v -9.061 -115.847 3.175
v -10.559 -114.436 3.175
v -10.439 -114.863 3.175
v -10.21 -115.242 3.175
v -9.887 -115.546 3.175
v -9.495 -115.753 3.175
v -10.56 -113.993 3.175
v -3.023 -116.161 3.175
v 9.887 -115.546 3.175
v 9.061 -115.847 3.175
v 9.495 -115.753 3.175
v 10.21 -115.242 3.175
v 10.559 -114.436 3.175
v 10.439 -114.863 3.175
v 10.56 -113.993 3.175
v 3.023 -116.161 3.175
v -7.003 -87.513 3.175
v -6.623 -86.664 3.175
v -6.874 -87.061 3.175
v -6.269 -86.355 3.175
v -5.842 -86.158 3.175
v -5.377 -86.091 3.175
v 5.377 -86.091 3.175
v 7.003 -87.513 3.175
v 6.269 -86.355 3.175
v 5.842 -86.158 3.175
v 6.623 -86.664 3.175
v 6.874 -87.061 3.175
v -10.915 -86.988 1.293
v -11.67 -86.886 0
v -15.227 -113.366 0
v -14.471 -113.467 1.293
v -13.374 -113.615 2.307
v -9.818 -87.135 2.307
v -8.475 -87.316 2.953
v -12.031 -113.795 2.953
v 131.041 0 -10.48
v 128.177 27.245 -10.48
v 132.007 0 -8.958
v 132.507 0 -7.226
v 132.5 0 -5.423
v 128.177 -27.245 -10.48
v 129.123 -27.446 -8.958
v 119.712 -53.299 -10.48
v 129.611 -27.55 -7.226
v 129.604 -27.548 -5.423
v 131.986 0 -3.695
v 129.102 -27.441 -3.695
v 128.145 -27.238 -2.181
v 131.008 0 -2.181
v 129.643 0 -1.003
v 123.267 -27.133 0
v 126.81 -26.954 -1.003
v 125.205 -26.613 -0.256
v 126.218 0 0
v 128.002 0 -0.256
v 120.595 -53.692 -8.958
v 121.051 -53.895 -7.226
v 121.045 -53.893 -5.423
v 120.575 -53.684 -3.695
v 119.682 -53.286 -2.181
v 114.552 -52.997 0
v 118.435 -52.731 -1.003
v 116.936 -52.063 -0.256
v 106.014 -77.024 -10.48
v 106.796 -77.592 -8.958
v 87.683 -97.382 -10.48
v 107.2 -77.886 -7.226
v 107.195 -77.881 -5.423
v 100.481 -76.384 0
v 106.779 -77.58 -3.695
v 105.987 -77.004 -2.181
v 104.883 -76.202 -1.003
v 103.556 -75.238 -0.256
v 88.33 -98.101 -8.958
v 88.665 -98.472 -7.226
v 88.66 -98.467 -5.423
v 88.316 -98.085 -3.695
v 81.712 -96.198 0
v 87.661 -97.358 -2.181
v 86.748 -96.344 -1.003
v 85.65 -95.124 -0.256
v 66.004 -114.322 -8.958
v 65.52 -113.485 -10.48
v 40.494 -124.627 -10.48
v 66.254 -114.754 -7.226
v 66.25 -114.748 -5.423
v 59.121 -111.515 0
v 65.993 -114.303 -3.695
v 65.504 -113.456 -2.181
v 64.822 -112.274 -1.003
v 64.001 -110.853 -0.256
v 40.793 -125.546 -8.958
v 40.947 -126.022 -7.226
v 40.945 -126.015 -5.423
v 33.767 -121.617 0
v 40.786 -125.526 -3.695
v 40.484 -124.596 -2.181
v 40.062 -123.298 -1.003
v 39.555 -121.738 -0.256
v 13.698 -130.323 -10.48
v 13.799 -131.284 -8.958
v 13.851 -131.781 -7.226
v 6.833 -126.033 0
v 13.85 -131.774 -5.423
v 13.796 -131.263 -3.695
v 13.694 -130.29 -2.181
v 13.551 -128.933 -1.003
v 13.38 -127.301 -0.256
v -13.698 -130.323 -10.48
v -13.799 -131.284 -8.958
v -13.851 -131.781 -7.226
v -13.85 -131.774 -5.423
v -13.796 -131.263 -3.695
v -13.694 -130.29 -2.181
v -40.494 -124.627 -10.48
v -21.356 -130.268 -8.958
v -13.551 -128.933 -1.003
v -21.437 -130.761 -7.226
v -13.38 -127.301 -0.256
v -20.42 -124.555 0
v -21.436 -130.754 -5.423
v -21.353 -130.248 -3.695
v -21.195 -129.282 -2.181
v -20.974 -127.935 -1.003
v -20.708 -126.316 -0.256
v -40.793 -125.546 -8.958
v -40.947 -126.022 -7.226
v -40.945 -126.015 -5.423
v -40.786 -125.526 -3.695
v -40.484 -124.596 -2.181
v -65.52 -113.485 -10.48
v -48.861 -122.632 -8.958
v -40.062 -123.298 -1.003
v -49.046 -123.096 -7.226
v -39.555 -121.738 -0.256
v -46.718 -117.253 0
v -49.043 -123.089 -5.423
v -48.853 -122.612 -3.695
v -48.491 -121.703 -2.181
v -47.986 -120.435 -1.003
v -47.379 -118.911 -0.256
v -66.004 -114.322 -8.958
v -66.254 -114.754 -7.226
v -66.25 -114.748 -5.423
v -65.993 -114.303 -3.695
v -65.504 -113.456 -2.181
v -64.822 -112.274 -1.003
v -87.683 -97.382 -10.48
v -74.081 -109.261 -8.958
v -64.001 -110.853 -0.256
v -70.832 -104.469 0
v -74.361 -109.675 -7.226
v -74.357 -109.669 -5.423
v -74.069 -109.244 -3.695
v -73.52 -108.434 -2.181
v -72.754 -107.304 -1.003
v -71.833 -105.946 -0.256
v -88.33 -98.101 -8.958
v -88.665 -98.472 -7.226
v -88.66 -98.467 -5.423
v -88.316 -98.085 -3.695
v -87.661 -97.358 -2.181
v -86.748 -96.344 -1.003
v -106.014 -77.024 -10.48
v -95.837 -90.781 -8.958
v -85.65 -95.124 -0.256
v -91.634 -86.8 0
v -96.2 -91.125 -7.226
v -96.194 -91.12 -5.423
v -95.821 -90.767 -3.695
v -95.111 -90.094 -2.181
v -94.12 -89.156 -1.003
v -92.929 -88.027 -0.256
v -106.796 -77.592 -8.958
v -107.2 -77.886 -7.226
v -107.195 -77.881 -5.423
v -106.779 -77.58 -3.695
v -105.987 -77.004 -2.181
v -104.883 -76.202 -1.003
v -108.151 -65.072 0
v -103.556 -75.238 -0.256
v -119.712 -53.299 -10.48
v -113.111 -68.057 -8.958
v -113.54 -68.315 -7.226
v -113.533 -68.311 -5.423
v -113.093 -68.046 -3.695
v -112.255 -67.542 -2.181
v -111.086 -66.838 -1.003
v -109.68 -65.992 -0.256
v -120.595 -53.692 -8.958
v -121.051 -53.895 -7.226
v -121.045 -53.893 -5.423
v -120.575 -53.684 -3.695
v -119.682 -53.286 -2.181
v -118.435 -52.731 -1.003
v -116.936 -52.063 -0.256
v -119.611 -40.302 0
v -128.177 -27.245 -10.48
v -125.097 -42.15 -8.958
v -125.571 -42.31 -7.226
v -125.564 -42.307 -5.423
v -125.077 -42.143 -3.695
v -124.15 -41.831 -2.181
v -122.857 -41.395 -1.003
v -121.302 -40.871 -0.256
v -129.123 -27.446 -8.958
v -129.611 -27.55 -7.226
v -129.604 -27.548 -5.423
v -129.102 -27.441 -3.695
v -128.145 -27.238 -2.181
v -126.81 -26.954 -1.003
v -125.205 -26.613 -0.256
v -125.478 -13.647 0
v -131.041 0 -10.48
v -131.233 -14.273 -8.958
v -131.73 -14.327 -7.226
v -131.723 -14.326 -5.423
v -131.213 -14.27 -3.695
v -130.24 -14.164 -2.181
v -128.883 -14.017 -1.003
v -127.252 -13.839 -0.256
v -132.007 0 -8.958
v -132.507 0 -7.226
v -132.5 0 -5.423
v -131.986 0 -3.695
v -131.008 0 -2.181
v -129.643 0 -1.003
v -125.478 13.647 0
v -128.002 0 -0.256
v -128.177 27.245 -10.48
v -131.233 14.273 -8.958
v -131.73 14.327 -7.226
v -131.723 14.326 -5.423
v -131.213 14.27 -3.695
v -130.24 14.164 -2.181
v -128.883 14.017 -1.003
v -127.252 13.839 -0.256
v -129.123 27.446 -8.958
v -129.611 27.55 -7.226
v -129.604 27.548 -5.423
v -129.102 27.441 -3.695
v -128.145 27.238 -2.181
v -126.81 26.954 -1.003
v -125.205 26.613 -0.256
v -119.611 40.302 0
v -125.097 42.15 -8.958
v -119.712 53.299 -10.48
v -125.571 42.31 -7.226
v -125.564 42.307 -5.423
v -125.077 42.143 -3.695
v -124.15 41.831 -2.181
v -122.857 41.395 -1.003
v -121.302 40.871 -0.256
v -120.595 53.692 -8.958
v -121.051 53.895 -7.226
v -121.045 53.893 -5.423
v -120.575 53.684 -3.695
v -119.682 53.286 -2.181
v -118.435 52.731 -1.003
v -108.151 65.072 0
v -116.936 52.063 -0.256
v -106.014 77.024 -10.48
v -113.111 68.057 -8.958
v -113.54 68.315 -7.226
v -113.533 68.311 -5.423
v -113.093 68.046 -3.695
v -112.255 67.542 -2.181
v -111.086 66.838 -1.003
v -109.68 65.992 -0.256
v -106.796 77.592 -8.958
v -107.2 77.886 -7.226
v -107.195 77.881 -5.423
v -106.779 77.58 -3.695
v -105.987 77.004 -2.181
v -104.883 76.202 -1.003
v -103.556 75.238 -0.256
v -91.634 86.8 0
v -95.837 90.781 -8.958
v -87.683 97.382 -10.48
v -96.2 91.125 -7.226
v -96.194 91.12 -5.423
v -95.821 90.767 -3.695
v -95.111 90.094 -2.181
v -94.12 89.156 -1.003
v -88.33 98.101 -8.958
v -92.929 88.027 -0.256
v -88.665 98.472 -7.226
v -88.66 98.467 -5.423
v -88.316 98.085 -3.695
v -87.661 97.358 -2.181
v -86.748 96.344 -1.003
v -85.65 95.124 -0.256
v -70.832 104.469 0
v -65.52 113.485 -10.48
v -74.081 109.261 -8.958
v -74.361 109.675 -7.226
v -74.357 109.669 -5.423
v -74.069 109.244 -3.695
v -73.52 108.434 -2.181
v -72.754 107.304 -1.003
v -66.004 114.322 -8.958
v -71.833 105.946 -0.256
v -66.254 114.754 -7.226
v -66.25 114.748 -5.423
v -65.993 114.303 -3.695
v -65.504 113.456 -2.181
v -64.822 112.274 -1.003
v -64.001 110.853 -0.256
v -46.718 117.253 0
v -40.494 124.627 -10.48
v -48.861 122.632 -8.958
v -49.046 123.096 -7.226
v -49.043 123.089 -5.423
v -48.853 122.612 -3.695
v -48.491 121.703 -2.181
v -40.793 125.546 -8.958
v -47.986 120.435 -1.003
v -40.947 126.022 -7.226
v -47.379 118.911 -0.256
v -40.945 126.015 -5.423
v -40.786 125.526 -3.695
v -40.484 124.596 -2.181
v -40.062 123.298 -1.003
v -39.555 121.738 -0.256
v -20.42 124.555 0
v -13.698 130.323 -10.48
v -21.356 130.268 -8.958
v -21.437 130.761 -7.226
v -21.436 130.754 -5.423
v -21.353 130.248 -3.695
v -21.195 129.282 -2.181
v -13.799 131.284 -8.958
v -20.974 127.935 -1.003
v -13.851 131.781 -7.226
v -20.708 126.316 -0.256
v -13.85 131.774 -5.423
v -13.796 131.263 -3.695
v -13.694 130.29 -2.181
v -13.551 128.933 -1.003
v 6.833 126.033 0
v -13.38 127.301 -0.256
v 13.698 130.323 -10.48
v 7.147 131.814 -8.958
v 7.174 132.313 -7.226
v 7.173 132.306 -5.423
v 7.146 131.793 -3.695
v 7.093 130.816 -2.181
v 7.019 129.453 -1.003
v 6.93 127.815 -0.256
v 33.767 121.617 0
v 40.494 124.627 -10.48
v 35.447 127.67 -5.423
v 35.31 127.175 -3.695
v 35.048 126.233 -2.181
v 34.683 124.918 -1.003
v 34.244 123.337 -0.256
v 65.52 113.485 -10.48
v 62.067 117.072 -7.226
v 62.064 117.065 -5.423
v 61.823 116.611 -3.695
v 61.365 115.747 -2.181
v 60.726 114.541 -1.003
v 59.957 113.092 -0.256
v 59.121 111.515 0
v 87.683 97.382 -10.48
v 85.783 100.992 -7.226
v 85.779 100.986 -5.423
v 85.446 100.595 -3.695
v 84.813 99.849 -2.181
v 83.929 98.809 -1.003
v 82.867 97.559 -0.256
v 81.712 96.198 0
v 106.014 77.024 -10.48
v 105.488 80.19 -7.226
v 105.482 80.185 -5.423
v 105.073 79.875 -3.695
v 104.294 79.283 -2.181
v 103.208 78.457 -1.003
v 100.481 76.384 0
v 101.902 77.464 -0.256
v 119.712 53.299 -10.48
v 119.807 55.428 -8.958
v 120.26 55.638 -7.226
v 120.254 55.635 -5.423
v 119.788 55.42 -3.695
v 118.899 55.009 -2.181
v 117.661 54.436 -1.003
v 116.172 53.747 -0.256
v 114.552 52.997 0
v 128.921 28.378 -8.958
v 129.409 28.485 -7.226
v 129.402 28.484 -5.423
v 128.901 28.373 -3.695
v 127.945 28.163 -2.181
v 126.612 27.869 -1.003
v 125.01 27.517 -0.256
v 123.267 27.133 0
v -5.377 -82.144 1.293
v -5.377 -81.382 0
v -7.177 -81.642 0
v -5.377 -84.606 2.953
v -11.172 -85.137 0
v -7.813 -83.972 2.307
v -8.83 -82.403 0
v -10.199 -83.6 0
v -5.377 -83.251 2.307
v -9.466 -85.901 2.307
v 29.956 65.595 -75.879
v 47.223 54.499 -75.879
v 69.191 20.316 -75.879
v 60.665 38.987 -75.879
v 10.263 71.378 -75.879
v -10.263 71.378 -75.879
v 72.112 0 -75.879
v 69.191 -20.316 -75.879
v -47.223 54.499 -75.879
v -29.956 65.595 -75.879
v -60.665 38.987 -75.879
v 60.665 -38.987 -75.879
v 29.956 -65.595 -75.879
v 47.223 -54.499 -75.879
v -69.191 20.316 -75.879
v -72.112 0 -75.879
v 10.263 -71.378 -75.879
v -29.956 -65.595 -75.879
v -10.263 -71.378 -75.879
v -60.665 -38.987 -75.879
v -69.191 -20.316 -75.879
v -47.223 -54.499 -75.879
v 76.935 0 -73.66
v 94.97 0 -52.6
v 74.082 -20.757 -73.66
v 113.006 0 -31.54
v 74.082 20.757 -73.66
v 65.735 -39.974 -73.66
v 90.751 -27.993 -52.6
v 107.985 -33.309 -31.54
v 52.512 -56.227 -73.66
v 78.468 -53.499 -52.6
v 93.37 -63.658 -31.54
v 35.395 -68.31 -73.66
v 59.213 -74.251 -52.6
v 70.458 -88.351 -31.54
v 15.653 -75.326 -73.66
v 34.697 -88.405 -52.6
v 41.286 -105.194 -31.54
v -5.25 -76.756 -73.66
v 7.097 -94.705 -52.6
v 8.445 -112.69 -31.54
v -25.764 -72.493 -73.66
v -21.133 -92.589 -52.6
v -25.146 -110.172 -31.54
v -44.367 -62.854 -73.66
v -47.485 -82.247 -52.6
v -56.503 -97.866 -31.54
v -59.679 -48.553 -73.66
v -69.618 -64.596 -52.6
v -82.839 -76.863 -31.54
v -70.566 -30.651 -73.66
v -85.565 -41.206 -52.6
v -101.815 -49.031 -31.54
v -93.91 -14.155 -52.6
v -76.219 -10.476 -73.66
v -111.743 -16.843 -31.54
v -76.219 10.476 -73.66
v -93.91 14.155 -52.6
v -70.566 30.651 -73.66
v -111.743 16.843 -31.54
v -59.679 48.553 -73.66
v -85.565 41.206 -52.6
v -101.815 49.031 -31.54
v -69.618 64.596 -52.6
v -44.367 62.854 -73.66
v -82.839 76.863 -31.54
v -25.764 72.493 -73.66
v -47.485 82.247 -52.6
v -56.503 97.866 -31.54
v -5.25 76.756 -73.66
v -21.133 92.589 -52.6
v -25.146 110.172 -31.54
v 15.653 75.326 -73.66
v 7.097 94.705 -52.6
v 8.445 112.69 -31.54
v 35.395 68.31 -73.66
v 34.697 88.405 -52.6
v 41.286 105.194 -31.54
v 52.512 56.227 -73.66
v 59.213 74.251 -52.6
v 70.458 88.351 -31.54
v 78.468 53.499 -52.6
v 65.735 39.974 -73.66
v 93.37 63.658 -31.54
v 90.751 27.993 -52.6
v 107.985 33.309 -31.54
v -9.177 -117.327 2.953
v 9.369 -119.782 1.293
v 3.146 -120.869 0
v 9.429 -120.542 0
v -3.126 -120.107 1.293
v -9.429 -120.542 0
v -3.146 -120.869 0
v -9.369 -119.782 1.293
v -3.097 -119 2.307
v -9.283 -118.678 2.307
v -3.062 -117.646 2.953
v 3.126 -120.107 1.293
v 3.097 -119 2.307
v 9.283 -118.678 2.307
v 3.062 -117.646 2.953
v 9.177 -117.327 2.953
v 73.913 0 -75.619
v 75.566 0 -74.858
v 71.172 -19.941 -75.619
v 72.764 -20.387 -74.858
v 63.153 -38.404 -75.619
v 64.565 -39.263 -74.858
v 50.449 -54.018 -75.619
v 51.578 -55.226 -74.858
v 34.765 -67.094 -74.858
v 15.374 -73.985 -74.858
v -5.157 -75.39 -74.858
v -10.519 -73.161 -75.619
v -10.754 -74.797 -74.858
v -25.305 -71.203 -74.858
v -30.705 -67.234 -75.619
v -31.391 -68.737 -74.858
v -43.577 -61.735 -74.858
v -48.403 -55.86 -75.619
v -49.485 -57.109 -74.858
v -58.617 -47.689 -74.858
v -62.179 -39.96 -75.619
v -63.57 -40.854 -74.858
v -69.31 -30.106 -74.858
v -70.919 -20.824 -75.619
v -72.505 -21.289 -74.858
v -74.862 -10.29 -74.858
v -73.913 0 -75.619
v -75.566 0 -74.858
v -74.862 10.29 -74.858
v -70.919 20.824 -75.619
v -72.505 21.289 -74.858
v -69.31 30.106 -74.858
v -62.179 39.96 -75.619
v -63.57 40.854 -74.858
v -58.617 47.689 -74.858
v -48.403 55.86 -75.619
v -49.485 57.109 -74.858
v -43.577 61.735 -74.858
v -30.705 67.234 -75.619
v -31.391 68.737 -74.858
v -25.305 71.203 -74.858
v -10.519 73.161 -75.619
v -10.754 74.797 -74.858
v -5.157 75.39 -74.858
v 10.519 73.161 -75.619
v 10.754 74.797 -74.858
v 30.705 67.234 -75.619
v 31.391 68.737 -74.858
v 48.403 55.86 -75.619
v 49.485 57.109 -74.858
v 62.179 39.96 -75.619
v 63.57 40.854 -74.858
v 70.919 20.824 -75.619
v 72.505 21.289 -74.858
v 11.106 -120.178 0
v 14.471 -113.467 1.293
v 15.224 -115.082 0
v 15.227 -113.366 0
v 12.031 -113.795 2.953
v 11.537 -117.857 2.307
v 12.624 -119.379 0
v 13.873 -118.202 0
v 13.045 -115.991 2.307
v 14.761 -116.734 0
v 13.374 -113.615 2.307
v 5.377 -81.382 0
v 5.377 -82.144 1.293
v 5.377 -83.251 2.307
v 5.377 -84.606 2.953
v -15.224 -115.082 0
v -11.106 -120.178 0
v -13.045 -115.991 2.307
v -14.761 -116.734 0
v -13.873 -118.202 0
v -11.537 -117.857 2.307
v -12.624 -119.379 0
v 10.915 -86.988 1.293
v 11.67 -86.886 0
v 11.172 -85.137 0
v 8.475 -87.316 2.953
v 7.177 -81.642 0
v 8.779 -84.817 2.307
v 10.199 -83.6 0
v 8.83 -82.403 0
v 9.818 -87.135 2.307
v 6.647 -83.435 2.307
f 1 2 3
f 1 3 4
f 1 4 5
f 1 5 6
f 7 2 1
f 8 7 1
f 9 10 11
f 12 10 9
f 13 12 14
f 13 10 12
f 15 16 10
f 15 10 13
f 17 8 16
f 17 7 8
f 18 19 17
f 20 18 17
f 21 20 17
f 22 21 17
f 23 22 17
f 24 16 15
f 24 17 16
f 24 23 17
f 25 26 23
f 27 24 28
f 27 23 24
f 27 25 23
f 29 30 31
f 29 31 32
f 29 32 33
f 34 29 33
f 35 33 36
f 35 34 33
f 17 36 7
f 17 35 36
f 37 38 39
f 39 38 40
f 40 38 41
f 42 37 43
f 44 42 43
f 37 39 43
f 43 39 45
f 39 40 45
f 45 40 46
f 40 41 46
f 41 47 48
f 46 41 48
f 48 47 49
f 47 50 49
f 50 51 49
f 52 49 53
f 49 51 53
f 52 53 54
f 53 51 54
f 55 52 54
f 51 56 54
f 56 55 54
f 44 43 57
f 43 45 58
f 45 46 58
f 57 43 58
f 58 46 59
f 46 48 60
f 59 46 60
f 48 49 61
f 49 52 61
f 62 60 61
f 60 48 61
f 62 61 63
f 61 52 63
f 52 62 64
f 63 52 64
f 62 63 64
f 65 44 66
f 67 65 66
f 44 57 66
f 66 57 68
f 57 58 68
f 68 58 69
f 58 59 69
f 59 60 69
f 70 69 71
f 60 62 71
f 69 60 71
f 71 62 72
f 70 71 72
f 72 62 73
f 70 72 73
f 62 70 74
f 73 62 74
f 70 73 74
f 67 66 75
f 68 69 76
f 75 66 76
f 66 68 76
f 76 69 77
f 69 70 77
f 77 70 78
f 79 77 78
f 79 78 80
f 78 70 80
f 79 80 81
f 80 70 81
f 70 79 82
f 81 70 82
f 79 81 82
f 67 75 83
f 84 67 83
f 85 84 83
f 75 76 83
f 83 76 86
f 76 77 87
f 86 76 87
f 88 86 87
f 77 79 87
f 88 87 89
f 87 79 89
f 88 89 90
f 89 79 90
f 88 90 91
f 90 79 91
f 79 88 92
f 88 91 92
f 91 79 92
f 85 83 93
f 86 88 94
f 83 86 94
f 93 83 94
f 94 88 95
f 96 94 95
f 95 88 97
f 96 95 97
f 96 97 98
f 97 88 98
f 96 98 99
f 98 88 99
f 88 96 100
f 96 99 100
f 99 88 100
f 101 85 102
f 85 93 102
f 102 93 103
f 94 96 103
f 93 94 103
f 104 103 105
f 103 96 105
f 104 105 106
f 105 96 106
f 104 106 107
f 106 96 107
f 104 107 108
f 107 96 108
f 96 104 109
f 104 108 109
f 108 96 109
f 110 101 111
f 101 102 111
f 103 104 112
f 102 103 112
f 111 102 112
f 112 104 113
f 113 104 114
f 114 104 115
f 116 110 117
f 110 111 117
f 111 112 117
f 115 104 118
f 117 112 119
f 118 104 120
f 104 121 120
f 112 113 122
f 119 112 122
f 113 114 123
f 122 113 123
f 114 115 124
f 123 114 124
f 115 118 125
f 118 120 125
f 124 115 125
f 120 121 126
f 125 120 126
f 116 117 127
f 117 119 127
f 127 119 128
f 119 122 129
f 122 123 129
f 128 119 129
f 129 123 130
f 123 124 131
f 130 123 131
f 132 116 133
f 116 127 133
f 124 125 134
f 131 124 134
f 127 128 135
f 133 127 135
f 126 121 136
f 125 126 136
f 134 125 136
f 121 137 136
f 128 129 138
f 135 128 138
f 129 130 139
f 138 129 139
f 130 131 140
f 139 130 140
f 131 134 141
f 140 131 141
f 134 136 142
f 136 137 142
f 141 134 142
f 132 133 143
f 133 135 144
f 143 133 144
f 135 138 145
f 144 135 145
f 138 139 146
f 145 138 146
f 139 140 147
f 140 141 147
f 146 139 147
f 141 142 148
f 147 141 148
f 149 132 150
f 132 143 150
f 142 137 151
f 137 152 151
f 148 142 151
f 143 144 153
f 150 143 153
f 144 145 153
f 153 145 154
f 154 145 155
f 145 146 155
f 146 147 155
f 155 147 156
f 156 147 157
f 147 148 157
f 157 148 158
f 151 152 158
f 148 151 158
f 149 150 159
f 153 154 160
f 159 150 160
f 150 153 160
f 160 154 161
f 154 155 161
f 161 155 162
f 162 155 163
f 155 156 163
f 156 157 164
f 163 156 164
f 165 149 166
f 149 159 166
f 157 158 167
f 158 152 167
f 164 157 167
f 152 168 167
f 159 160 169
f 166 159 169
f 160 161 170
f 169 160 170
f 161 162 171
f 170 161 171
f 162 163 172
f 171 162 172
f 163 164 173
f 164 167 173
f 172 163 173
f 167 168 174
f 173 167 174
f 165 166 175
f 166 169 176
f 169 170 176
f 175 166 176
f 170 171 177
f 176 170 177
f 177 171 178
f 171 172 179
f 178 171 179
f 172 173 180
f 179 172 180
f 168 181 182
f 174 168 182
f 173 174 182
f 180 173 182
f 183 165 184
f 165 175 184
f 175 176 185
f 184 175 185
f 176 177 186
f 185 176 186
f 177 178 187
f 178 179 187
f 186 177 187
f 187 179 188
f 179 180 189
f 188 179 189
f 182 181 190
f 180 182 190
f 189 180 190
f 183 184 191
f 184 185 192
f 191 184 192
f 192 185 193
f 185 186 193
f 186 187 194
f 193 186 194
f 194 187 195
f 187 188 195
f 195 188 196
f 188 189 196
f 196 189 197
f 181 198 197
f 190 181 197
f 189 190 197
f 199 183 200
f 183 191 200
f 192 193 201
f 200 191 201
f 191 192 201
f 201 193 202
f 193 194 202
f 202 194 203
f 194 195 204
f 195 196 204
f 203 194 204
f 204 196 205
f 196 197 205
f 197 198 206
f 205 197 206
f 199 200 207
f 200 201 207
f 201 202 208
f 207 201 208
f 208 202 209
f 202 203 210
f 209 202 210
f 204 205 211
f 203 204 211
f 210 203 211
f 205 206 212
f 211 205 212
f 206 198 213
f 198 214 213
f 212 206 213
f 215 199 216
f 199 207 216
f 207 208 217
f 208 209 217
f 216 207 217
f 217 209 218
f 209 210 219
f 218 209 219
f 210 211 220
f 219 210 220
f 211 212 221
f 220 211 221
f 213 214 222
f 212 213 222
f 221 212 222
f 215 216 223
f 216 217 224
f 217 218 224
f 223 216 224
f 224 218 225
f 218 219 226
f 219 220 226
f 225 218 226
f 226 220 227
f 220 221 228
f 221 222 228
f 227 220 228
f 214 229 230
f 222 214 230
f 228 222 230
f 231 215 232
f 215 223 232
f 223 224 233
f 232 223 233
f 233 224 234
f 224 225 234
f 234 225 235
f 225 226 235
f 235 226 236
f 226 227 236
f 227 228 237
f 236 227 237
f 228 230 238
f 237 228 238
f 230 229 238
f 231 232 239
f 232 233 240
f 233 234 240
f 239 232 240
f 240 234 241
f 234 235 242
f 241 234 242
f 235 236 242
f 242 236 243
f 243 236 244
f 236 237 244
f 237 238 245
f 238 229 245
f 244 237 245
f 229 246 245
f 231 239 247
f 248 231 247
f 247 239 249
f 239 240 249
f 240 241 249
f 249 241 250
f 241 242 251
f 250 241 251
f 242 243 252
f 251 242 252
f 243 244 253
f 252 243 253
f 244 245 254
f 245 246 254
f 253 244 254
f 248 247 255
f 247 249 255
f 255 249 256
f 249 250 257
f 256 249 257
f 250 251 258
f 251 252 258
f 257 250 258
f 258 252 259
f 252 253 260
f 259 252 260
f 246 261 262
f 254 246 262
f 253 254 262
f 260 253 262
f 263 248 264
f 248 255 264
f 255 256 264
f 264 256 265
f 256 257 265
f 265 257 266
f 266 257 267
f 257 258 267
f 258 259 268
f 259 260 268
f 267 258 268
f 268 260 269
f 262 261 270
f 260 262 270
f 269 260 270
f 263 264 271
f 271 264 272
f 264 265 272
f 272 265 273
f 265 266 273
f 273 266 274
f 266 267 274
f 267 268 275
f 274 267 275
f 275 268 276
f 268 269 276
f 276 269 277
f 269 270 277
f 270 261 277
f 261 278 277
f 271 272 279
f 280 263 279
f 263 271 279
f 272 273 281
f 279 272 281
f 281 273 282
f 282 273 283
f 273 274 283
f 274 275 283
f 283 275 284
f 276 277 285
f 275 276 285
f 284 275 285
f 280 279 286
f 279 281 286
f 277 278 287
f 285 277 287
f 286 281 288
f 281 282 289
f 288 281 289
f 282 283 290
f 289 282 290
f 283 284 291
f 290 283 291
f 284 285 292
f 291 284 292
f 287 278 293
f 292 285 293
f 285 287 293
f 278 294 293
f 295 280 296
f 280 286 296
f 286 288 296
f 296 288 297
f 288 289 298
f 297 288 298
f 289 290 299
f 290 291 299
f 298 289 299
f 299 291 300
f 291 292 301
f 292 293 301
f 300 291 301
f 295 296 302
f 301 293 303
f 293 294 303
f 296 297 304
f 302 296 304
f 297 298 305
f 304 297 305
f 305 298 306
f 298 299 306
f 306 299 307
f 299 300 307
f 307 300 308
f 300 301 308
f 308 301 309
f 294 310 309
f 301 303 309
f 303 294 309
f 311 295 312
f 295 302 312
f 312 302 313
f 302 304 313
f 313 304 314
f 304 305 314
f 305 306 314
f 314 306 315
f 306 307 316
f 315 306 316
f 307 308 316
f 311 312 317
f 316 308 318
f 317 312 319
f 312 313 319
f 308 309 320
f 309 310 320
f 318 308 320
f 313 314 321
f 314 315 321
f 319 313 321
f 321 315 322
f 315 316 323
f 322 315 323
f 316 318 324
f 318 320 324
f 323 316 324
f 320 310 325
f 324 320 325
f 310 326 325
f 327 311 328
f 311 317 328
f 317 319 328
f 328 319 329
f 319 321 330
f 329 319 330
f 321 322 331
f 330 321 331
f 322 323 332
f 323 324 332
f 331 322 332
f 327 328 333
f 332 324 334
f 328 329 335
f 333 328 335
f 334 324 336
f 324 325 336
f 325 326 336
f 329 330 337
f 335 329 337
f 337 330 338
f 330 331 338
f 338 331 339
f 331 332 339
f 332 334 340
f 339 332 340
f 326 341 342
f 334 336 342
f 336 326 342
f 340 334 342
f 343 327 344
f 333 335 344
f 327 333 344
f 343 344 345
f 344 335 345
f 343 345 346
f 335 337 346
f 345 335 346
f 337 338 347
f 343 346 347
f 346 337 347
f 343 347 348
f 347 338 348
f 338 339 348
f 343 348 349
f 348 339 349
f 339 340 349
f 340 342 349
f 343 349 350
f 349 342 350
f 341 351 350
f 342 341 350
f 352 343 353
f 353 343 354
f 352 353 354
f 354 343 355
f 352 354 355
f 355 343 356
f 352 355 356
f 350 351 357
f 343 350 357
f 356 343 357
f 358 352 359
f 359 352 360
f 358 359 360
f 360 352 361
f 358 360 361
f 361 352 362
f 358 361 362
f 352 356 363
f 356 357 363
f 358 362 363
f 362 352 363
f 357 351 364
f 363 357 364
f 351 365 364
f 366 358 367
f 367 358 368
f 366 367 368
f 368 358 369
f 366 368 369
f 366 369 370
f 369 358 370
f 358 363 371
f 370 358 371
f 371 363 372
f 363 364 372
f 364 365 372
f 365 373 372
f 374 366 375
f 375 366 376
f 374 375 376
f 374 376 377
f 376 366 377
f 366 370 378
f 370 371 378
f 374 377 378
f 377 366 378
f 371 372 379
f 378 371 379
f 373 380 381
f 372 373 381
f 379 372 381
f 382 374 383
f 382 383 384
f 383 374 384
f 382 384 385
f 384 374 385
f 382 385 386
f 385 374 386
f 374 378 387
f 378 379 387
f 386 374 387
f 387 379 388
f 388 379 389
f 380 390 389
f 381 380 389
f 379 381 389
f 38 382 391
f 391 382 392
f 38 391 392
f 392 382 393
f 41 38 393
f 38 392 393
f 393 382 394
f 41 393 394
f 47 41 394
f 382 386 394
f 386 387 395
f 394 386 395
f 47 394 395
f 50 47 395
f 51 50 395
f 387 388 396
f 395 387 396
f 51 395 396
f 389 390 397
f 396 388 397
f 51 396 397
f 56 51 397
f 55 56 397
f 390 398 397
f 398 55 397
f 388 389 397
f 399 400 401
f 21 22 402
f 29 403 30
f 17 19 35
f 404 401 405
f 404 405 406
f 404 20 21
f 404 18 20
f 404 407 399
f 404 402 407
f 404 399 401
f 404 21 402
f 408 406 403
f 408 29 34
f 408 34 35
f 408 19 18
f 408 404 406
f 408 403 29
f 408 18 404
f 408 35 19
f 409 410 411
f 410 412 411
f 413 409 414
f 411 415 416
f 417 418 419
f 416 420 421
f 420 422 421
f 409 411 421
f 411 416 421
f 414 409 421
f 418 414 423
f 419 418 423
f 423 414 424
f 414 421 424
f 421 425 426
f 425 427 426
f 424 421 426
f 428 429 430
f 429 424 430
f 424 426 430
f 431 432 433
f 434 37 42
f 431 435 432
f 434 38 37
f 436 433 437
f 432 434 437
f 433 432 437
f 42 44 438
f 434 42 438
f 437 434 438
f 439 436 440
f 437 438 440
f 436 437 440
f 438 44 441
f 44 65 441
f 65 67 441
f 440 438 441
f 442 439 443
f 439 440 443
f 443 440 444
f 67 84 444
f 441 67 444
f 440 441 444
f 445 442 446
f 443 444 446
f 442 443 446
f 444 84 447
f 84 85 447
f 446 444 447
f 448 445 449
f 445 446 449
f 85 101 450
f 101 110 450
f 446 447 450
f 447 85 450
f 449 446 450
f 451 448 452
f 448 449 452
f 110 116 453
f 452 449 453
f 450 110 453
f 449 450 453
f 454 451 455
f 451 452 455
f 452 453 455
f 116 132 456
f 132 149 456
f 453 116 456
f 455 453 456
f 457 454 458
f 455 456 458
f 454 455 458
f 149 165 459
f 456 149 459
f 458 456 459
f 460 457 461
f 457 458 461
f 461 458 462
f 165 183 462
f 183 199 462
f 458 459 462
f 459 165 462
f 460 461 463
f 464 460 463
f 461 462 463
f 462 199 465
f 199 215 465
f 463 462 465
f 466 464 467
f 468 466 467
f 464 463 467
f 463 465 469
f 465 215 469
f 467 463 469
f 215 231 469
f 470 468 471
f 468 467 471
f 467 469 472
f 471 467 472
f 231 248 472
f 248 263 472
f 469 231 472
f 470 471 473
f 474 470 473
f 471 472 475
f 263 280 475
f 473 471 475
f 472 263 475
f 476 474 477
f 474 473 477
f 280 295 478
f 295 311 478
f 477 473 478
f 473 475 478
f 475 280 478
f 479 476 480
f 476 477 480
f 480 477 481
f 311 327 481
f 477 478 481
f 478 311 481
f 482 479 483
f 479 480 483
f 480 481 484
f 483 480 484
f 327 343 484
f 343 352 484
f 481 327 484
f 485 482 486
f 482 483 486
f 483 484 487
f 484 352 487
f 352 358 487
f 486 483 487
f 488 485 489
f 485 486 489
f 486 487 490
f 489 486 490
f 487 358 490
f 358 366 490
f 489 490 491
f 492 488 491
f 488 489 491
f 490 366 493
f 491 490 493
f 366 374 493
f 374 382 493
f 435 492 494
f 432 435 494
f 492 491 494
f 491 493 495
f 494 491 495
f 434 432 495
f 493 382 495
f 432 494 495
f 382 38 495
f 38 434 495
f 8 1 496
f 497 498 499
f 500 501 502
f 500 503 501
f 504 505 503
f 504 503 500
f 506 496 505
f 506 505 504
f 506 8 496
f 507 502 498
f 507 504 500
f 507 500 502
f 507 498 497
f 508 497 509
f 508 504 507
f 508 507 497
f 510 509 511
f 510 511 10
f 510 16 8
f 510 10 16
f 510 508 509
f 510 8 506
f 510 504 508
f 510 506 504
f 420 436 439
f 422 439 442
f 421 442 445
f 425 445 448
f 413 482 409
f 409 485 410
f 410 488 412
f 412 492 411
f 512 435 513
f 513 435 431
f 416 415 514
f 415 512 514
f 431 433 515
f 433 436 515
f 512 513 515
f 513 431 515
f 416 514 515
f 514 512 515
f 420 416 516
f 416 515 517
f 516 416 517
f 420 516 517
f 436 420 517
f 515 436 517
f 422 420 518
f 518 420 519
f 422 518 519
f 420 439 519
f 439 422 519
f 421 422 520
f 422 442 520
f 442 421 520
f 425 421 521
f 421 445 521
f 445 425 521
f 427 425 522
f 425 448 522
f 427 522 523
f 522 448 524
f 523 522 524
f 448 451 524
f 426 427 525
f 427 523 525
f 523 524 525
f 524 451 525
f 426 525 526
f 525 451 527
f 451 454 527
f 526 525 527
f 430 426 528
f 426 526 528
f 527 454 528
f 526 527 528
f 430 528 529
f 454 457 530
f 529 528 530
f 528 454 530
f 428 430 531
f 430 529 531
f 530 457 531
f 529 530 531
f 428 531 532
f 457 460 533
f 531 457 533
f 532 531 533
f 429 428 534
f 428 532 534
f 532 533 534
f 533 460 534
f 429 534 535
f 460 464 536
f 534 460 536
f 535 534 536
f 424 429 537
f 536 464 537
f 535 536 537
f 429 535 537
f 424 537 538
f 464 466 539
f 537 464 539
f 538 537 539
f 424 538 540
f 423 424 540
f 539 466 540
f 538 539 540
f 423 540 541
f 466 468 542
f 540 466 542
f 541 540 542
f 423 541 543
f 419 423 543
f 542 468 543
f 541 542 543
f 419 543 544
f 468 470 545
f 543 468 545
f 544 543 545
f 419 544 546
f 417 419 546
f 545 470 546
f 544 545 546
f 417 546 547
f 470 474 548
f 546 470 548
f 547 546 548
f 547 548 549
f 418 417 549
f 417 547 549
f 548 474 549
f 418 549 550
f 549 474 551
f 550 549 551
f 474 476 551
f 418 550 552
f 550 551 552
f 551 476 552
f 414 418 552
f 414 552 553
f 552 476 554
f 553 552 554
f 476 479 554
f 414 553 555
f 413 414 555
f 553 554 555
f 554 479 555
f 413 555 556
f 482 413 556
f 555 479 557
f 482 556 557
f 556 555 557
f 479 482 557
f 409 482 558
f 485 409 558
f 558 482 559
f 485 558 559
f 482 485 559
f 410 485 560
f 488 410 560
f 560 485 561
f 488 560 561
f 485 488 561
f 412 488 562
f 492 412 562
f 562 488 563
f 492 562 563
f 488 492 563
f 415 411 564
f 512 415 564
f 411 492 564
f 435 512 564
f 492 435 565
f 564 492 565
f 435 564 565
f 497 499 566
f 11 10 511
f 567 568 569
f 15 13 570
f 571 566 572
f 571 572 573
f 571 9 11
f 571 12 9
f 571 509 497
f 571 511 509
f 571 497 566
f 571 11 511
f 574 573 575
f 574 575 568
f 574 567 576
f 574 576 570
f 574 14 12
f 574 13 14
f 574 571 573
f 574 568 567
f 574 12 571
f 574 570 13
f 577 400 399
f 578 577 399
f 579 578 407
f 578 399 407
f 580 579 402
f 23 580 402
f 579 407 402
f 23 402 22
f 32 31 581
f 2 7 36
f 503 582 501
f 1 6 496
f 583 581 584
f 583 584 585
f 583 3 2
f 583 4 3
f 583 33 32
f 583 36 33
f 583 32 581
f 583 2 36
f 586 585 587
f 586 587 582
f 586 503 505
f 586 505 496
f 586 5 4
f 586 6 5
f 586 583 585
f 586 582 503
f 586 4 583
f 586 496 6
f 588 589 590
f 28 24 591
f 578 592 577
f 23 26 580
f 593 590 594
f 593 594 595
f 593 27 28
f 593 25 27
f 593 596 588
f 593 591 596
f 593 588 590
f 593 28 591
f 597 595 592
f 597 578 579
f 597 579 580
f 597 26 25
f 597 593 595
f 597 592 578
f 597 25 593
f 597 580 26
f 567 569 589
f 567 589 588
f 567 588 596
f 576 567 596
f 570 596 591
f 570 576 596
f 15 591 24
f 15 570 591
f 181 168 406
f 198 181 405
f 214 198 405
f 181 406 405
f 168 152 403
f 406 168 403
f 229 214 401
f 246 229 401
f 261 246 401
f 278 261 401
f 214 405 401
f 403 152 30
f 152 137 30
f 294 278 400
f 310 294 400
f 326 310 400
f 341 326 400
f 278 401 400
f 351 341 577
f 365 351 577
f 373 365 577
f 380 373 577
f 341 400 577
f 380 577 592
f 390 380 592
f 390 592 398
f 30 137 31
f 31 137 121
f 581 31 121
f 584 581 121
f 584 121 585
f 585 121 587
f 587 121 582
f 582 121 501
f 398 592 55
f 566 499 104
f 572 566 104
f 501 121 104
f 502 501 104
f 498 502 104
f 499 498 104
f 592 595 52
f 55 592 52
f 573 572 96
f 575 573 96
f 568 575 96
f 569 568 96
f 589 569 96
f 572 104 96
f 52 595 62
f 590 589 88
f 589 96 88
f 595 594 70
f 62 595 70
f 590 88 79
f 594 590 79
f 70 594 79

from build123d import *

# Parameters (mm, degrees)
F3_DEPTH     = 3.175
F4_T1_DEPTH  = 26.7171757075
F4_T3_DEPTH  = 10.7537660931
F4_T5_DEPTH  = 26.7171757075
F4_T8_ANGLE  = 93.1775029202
F4_T10_ANGLE = 82.3499629572
F4_T12_ANGLE = 82.3499629572
F4_T14_ANGLE = 93.1775029202
F4_T16_ANGLE = 8.9450682453


# Not quite as in the source:
# - a fillet or chamfer that OpenCascade refuses, or shapes differently, is made with other operations: its cross-section is extruded or revolved along the edge and cut away or added


with BuildPart() as f1:
    # F0 (on Front) → F1 (revolve)
    with BuildSketch(Plane.XZ):
        with BuildLine():
            Line((126.2178106584, 0), (0, 0))
            Line((0, 0), (0, -75.8794099092))
            Line((0, -75.8794099092), (72.1120906848, -75.8794099092))
            ThreePointArc((72.1120906848, -75.8794099092), (74.7667467473, -75.2978846808), (76.9351825033, -73.6598197328))
            Line((76.9351825033, -73.6598197328), (131.0409024769, -10.4804098236))
            ThreePointArc((131.0409024769, -10.4804098236), (131.98628543, -3.6953439375), (126.2178106584, 0))
        make_face()
    revolve(axis=Axis((0, 0, -37.9397049546), (0, 0, -1)))

    # F2 (on face) → F3 (join)
    with BuildSketch(Plane.XY):
        with BuildLine():
            Line((15.2270092071, -113.3658299561), (11.6703658958, -86.8864461614))
            ThreePointArc((11.6703658958, -86.8864461614), (9.5574744515, -82.9521101243), (5.3768830466, -81.3817707299))
            Line((5.3768830466, -81.3817707299), (0, -81.3817707299))
            Line((0, -81.3817707299), (-5.3768830466, -81.3817707299))
            ThreePointArc((-5.3768830466, -81.3817707299), (-9.5574744515, -82.9521101243), (-11.6703658958, -86.8864461614))
            Line((-11.6703658958, -86.8864461614), (-15.2270092071, -113.3658299561))
            ThreePointArc((-15.2270092071, -113.3658299561), (-13.8726748488, -118.2020582047), (-9.4287069428, -120.5418176958))
            ThreePointArc((-9.4287069428, -120.5418176958), (0, -120.9100092136), (9.4287069428, -120.5418176958))
            ThreePointArc((9.4287069428, -120.5418176958), (13.8726748488, -118.2020582047), (15.2270092071, -113.3658299561))
        make_face()
    extrude(amount=F3_DEPTH)

    # F4: fillet of radius 5.08 on 1 edges, made by hand

    # F4_s2 → F4_t1 (cut)
    with BuildSketch(Plane(origin=(15.2270092071, -113.3658299561, 0), x_dir=(0, 0, 1), z_dir=(-0.1331219793, 0.9910996613, 0))):
        with BuildLine():
            ThreePointArc((0, 0), (2.3071134838, -1.8694797079), (3.175, -4.7092860393))
            Line((3.175, -4.7092860393), (3.175, 0))
            Line((3.175, 0), (0, 0))
        make_face()
    extrude(amount=F4_T1_DEPTH, mode=Mode.SUBTRACT)

    # F4_s4 → F4_t3 (cut)
    with BuildSketch(Plane.YZ.offset(-5.3768830466)):
        with BuildLine():
            ThreePointArc((-81.3817707299, 0), (-83.2512504378, 2.3071134838), (-86.0910567692, 3.175))
            Line((-86.0910567692, 3.175), (-81.3817707299, 3.175))
            Line((-81.3817707299, 3.175), (-81.3817707299, 0))
        make_face()
    extrude(amount=F4_T3_DEPTH, mode=Mode.SUBTRACT)

    # F4_s6 → F4_t5 (cut)
    with BuildSketch(Plane(origin=(-11.6703658958, -86.8864461614, 0), x_dir=(0, 0, 1), z_dir=(-0.1331219793, -0.9910996613, 0))):
        with BuildLine():
            ThreePointArc((0, 0), (2.3071134838, -1.8694797079), (3.175, -4.7092860393))
            Line((3.175, -4.7092860393), (3.175, 0))
            Line((3.175, 0), (0, 0))
        make_face()
    extrude(amount=F4_T5_DEPTH, mode=Mode.SUBTRACT)

    # F4_s7 → F4_t8 (revolve, cut)
    with BuildSketch(Plane(origin=(0, 0, 0), x_dir=(0, 0, 1), z_dir=(-0.9969548301, -0.0779811945, 0))):
        with BuildLine():
            ThreePointArc((0, -120.9100092136), (2.3071134838, -119.0405295057), (3.175, -116.2007231743))
            Line((3.175, -116.2007231743), (3.175, -120.9100092136))
            Line((3.175, -120.9100092136), (0, -120.9100092136))
        make_face()
    revolve(axis=Axis((8.9335263578, -114.2111545246, 3.175), (0, 0, 1)), revolution_arc=F4_T8_ANGLE, mode=Mode.SUBTRACT)

    # F4_s9 → F4_t10 (revolve, cut)
    with BuildSketch(Plane(origin=(11.6703658958, -86.8864461614, 0), x_dir=(0, 0, 1), z_dir=(0.1331219793, -0.9910996613, 0))):
        with BuildLine():
            ThreePointArc((0, 0), (2.3071134838, 1.8694797079), (3.175, 4.7092860393))
            Line((3.175, 4.7092860393), (3.175, 0))
            Line((3.175, 0), (0, 0))
        make_face()
    revolve(axis=Axis((5.3768830466, -87.7317707299, 3.175), (0, 0, 1)), revolution_arc=F4_T10_ANGLE, mode=Mode.SUBTRACT)

    # F4_s11 → F4_t12 (revolve, cut)
    with BuildSketch(Plane.YZ.offset(-5.3768830466)):
        with BuildLine():
            ThreePointArc((-81.3817707299, 0), (-83.2512504378, 2.3071134838), (-86.0910567692, 3.175))
            Line((-86.0910567692, 3.175), (-81.3817707299, 3.175))
            Line((-81.3817707299, 3.175), (-81.3817707299, 0))
        make_face()
    revolve(axis=Axis((-5.3768830466, -87.7317707299, 3.175), (0, 0, 1)), revolution_arc=F4_T12_ANGLE, mode=Mode.SUBTRACT)

    # F4_s13 → F4_t14 (revolve, cut)
    with BuildSketch(Plane(origin=(-15.2270092071, -113.3658299561, 0), x_dir=(0, 0, 1), z_dir=(0.1331219793, 0.9910996613, 0))):
        with BuildLine():
            ThreePointArc((0, 0), (2.3071134838, 1.8694797079), (3.175, 4.7092860393))
            Line((3.175, 4.7092860393), (3.175, 0))
            Line((3.175, 0), (0, 0))
        make_face()
    revolve(axis=Axis((-8.9335263578, -114.2111545246, 3.175), (0, 0, 1)), revolution_arc=F4_T14_ANGLE, mode=Mode.SUBTRACT)

    # F4_s15 → F4_t16 (revolve, cut)
    with BuildSketch(Plane(origin=(0, 0, 0), x_dir=(0, 0, 1), z_dir=(-0.9969548301, 0.0779811945, 0))):
        with BuildLine():
            ThreePointArc((0, -120.9100092136), (2.3071134838, -119.0405295057), (3.175, -116.2007231743))
            Line((3.175, -116.2007231743), (3.175, -120.9100092136))
            Line((3.175, -120.9100092136), (0, -120.9100092136))
        make_face()
    revolve(axis=Axis((0, 0, 3.175), (0, 0, 1)), revolution_arc=F4_T16_ANGLE, mode=Mode.SUBTRACT)


solid = f1.part
